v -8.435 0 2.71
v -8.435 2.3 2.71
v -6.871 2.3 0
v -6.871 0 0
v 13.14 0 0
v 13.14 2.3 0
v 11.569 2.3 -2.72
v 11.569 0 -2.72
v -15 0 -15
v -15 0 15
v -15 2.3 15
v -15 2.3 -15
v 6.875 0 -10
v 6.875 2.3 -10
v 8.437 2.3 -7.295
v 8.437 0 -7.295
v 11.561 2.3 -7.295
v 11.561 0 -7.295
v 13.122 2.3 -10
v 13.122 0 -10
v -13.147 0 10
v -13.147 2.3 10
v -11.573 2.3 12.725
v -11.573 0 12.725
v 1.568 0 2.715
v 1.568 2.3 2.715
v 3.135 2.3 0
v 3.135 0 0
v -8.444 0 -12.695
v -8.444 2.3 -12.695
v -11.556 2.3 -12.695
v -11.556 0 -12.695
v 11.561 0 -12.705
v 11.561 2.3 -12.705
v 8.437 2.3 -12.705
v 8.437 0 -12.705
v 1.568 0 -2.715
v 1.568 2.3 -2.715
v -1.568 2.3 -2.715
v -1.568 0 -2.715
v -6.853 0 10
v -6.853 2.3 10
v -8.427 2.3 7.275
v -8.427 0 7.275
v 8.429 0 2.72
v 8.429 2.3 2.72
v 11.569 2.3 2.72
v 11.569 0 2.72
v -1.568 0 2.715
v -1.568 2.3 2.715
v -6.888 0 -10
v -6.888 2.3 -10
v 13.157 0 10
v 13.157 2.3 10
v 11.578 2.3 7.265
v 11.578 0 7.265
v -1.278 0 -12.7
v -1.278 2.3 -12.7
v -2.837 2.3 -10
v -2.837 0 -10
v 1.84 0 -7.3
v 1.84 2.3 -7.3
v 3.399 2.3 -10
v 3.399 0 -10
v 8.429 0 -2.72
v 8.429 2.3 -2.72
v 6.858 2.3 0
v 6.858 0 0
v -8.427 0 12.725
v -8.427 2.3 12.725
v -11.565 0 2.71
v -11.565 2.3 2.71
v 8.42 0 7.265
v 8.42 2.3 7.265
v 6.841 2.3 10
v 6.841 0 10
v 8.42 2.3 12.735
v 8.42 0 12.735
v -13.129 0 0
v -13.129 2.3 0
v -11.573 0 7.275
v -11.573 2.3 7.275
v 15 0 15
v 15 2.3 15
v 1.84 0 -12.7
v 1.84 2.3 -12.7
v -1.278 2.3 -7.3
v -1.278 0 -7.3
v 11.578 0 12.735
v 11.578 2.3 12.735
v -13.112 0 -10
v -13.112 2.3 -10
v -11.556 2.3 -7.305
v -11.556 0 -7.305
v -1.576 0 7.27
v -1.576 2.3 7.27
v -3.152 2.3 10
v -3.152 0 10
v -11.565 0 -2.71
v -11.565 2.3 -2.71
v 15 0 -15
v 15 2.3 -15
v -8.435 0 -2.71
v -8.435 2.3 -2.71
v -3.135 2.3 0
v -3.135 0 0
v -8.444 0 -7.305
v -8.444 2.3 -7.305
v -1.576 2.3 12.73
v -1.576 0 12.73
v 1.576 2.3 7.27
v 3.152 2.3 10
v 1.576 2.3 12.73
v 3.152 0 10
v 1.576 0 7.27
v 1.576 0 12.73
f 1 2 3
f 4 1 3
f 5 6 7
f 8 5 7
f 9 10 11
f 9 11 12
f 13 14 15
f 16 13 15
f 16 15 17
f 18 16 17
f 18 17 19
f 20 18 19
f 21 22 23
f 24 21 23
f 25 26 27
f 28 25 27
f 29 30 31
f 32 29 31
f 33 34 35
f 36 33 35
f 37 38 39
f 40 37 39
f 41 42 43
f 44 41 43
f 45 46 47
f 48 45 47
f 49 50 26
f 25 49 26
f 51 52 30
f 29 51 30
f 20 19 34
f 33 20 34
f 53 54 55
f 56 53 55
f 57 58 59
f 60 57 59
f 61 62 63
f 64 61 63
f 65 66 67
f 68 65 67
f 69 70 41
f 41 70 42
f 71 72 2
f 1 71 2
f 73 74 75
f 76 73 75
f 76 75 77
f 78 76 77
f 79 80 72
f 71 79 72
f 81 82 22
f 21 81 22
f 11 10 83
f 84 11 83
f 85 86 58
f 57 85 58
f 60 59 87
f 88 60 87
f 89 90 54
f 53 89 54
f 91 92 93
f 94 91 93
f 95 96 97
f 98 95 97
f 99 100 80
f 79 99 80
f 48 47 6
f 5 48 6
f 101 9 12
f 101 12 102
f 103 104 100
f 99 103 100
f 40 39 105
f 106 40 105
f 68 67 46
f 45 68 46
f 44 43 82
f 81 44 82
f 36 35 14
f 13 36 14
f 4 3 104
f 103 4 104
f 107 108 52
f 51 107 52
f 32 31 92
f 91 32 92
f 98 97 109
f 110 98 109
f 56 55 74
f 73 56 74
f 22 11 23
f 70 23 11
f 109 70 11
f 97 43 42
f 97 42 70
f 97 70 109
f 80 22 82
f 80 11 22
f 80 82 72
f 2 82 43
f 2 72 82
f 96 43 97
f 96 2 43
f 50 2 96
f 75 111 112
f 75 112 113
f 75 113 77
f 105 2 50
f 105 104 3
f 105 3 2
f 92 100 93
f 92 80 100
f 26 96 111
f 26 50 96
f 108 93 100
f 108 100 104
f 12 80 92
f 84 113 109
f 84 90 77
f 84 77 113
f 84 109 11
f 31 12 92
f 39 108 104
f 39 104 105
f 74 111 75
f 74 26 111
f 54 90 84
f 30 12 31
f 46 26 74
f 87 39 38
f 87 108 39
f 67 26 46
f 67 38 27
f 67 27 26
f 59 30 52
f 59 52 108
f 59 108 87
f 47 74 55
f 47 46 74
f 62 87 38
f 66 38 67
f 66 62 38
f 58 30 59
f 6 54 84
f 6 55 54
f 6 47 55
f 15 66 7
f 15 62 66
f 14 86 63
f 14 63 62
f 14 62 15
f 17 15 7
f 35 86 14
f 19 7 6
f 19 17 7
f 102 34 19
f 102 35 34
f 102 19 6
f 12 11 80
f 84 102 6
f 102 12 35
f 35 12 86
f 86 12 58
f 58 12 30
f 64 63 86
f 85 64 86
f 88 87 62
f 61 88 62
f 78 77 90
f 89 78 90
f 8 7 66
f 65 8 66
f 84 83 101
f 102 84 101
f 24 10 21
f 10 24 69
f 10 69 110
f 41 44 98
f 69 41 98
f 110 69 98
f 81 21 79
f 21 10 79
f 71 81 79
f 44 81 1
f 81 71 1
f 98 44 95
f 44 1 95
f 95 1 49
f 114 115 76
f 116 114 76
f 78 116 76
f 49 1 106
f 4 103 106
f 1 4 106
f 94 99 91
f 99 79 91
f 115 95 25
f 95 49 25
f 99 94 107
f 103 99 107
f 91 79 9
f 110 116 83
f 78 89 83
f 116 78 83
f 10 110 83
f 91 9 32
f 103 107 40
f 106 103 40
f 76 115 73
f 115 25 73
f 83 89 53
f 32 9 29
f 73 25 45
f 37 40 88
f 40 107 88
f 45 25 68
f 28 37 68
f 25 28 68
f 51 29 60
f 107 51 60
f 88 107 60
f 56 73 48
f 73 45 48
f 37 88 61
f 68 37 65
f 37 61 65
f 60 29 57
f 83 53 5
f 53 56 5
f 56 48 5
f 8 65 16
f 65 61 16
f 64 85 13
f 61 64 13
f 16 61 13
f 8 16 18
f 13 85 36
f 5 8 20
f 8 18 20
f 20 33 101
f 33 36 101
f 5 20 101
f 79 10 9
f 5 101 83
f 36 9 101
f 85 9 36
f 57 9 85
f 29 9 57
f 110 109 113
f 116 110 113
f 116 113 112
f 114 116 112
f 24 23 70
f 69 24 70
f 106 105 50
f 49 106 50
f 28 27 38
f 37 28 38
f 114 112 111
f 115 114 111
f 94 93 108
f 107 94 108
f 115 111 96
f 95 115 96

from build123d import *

# Parameters (mm, degrees)
SKETCH1_W           = 30
SKETCH1_H           = 30
BOSS_EXTRUDE1_DEPTH = 2.3
CUT_EXTRUDE3_DEPTH  = 2.3


with BuildPart() as part:
    # Sketch1 → Boss-Extrude1 (new body)
    with BuildSketch(Plane(origin=(0, 0, 0), x_dir=(1, 0, 0), z_dir=(0, 1, 0))):
        Rectangle(SKETCH1_W, SKETCH1_H)
    extrude(amount=BOSS_EXTRUDE1_DEPTH)

    # Sketch2 → Cut-Extrude3 (cut)
    with BuildSketch(Plane(origin=(0, 2.3, 0), x_dir=(1, 0, 0), z_dir=(0, 1, 0))):
        Polygon((3.135011962, 0), (1.567505981, 2.715), (-1.567505981, 2.715), (-3.135011962, 0), (-1.567505981, -2.715), (1.567505981, -2.715), align=None)
        Polygon((-6.888082049, 10), (-8.444041025, 12.695), (-11.555958975, 12.695), (-13.111917951, 10), (-11.555958975, 7.305), (-8.444041025, 7.305), align=None)
        Polygon((3.39878526, 10), (1.839939533, 12.7), (-1.277751921, 12.7), (-2.836597647, 10), (-1.277751921, 7.3), (1.839939533, 7.3), align=None)
        Polygon((13.122373208, 10), (11.56064073, 12.705), (8.437175774, 12.705), (6.875443295, 10), (8.437175774, 7.295), (11.56064073, 7.295), align=None)
        Polygon((13.139693716, 0), (11.569300984, 2.72), (8.42851552, 2.72), (6.858122787, 0), (8.42851552, -2.72), (11.569300984, -2.72), align=None)
        Polygon((13.157014224, -10), (11.577961238, -7.265), (8.419855266, -7.265), (6.840802279, -10), (8.419855266, -12.735), (11.577961238, -12.735), align=None)
        Polygon((3.15233247, -10), (1.576166235, -7.27), (-1.576166235, -7.27), (-3.15233247, -10), (-1.576166235, -12.73), (1.576166235, -12.73), align=None)
        Polygon((-6.853441033, -10), (-8.426720516, -7.275), (-11.573279484, -7.275), (-13.146558967, -10), (-11.573279484, -12.725), (-8.426720516, -12.725), align=None)
        Polygon((-6.870761541, 0), (-8.43538077, 2.71), (-11.56461923, 2.71), (-13.129238459, 0), (-11.56461923, -2.71), (-8.43538077, -2.71), align=None)
    extrude(amount=-CUT_EXTRUDE3_DEPTH, mode=Mode.SUBTRACT)


solid = part.part
